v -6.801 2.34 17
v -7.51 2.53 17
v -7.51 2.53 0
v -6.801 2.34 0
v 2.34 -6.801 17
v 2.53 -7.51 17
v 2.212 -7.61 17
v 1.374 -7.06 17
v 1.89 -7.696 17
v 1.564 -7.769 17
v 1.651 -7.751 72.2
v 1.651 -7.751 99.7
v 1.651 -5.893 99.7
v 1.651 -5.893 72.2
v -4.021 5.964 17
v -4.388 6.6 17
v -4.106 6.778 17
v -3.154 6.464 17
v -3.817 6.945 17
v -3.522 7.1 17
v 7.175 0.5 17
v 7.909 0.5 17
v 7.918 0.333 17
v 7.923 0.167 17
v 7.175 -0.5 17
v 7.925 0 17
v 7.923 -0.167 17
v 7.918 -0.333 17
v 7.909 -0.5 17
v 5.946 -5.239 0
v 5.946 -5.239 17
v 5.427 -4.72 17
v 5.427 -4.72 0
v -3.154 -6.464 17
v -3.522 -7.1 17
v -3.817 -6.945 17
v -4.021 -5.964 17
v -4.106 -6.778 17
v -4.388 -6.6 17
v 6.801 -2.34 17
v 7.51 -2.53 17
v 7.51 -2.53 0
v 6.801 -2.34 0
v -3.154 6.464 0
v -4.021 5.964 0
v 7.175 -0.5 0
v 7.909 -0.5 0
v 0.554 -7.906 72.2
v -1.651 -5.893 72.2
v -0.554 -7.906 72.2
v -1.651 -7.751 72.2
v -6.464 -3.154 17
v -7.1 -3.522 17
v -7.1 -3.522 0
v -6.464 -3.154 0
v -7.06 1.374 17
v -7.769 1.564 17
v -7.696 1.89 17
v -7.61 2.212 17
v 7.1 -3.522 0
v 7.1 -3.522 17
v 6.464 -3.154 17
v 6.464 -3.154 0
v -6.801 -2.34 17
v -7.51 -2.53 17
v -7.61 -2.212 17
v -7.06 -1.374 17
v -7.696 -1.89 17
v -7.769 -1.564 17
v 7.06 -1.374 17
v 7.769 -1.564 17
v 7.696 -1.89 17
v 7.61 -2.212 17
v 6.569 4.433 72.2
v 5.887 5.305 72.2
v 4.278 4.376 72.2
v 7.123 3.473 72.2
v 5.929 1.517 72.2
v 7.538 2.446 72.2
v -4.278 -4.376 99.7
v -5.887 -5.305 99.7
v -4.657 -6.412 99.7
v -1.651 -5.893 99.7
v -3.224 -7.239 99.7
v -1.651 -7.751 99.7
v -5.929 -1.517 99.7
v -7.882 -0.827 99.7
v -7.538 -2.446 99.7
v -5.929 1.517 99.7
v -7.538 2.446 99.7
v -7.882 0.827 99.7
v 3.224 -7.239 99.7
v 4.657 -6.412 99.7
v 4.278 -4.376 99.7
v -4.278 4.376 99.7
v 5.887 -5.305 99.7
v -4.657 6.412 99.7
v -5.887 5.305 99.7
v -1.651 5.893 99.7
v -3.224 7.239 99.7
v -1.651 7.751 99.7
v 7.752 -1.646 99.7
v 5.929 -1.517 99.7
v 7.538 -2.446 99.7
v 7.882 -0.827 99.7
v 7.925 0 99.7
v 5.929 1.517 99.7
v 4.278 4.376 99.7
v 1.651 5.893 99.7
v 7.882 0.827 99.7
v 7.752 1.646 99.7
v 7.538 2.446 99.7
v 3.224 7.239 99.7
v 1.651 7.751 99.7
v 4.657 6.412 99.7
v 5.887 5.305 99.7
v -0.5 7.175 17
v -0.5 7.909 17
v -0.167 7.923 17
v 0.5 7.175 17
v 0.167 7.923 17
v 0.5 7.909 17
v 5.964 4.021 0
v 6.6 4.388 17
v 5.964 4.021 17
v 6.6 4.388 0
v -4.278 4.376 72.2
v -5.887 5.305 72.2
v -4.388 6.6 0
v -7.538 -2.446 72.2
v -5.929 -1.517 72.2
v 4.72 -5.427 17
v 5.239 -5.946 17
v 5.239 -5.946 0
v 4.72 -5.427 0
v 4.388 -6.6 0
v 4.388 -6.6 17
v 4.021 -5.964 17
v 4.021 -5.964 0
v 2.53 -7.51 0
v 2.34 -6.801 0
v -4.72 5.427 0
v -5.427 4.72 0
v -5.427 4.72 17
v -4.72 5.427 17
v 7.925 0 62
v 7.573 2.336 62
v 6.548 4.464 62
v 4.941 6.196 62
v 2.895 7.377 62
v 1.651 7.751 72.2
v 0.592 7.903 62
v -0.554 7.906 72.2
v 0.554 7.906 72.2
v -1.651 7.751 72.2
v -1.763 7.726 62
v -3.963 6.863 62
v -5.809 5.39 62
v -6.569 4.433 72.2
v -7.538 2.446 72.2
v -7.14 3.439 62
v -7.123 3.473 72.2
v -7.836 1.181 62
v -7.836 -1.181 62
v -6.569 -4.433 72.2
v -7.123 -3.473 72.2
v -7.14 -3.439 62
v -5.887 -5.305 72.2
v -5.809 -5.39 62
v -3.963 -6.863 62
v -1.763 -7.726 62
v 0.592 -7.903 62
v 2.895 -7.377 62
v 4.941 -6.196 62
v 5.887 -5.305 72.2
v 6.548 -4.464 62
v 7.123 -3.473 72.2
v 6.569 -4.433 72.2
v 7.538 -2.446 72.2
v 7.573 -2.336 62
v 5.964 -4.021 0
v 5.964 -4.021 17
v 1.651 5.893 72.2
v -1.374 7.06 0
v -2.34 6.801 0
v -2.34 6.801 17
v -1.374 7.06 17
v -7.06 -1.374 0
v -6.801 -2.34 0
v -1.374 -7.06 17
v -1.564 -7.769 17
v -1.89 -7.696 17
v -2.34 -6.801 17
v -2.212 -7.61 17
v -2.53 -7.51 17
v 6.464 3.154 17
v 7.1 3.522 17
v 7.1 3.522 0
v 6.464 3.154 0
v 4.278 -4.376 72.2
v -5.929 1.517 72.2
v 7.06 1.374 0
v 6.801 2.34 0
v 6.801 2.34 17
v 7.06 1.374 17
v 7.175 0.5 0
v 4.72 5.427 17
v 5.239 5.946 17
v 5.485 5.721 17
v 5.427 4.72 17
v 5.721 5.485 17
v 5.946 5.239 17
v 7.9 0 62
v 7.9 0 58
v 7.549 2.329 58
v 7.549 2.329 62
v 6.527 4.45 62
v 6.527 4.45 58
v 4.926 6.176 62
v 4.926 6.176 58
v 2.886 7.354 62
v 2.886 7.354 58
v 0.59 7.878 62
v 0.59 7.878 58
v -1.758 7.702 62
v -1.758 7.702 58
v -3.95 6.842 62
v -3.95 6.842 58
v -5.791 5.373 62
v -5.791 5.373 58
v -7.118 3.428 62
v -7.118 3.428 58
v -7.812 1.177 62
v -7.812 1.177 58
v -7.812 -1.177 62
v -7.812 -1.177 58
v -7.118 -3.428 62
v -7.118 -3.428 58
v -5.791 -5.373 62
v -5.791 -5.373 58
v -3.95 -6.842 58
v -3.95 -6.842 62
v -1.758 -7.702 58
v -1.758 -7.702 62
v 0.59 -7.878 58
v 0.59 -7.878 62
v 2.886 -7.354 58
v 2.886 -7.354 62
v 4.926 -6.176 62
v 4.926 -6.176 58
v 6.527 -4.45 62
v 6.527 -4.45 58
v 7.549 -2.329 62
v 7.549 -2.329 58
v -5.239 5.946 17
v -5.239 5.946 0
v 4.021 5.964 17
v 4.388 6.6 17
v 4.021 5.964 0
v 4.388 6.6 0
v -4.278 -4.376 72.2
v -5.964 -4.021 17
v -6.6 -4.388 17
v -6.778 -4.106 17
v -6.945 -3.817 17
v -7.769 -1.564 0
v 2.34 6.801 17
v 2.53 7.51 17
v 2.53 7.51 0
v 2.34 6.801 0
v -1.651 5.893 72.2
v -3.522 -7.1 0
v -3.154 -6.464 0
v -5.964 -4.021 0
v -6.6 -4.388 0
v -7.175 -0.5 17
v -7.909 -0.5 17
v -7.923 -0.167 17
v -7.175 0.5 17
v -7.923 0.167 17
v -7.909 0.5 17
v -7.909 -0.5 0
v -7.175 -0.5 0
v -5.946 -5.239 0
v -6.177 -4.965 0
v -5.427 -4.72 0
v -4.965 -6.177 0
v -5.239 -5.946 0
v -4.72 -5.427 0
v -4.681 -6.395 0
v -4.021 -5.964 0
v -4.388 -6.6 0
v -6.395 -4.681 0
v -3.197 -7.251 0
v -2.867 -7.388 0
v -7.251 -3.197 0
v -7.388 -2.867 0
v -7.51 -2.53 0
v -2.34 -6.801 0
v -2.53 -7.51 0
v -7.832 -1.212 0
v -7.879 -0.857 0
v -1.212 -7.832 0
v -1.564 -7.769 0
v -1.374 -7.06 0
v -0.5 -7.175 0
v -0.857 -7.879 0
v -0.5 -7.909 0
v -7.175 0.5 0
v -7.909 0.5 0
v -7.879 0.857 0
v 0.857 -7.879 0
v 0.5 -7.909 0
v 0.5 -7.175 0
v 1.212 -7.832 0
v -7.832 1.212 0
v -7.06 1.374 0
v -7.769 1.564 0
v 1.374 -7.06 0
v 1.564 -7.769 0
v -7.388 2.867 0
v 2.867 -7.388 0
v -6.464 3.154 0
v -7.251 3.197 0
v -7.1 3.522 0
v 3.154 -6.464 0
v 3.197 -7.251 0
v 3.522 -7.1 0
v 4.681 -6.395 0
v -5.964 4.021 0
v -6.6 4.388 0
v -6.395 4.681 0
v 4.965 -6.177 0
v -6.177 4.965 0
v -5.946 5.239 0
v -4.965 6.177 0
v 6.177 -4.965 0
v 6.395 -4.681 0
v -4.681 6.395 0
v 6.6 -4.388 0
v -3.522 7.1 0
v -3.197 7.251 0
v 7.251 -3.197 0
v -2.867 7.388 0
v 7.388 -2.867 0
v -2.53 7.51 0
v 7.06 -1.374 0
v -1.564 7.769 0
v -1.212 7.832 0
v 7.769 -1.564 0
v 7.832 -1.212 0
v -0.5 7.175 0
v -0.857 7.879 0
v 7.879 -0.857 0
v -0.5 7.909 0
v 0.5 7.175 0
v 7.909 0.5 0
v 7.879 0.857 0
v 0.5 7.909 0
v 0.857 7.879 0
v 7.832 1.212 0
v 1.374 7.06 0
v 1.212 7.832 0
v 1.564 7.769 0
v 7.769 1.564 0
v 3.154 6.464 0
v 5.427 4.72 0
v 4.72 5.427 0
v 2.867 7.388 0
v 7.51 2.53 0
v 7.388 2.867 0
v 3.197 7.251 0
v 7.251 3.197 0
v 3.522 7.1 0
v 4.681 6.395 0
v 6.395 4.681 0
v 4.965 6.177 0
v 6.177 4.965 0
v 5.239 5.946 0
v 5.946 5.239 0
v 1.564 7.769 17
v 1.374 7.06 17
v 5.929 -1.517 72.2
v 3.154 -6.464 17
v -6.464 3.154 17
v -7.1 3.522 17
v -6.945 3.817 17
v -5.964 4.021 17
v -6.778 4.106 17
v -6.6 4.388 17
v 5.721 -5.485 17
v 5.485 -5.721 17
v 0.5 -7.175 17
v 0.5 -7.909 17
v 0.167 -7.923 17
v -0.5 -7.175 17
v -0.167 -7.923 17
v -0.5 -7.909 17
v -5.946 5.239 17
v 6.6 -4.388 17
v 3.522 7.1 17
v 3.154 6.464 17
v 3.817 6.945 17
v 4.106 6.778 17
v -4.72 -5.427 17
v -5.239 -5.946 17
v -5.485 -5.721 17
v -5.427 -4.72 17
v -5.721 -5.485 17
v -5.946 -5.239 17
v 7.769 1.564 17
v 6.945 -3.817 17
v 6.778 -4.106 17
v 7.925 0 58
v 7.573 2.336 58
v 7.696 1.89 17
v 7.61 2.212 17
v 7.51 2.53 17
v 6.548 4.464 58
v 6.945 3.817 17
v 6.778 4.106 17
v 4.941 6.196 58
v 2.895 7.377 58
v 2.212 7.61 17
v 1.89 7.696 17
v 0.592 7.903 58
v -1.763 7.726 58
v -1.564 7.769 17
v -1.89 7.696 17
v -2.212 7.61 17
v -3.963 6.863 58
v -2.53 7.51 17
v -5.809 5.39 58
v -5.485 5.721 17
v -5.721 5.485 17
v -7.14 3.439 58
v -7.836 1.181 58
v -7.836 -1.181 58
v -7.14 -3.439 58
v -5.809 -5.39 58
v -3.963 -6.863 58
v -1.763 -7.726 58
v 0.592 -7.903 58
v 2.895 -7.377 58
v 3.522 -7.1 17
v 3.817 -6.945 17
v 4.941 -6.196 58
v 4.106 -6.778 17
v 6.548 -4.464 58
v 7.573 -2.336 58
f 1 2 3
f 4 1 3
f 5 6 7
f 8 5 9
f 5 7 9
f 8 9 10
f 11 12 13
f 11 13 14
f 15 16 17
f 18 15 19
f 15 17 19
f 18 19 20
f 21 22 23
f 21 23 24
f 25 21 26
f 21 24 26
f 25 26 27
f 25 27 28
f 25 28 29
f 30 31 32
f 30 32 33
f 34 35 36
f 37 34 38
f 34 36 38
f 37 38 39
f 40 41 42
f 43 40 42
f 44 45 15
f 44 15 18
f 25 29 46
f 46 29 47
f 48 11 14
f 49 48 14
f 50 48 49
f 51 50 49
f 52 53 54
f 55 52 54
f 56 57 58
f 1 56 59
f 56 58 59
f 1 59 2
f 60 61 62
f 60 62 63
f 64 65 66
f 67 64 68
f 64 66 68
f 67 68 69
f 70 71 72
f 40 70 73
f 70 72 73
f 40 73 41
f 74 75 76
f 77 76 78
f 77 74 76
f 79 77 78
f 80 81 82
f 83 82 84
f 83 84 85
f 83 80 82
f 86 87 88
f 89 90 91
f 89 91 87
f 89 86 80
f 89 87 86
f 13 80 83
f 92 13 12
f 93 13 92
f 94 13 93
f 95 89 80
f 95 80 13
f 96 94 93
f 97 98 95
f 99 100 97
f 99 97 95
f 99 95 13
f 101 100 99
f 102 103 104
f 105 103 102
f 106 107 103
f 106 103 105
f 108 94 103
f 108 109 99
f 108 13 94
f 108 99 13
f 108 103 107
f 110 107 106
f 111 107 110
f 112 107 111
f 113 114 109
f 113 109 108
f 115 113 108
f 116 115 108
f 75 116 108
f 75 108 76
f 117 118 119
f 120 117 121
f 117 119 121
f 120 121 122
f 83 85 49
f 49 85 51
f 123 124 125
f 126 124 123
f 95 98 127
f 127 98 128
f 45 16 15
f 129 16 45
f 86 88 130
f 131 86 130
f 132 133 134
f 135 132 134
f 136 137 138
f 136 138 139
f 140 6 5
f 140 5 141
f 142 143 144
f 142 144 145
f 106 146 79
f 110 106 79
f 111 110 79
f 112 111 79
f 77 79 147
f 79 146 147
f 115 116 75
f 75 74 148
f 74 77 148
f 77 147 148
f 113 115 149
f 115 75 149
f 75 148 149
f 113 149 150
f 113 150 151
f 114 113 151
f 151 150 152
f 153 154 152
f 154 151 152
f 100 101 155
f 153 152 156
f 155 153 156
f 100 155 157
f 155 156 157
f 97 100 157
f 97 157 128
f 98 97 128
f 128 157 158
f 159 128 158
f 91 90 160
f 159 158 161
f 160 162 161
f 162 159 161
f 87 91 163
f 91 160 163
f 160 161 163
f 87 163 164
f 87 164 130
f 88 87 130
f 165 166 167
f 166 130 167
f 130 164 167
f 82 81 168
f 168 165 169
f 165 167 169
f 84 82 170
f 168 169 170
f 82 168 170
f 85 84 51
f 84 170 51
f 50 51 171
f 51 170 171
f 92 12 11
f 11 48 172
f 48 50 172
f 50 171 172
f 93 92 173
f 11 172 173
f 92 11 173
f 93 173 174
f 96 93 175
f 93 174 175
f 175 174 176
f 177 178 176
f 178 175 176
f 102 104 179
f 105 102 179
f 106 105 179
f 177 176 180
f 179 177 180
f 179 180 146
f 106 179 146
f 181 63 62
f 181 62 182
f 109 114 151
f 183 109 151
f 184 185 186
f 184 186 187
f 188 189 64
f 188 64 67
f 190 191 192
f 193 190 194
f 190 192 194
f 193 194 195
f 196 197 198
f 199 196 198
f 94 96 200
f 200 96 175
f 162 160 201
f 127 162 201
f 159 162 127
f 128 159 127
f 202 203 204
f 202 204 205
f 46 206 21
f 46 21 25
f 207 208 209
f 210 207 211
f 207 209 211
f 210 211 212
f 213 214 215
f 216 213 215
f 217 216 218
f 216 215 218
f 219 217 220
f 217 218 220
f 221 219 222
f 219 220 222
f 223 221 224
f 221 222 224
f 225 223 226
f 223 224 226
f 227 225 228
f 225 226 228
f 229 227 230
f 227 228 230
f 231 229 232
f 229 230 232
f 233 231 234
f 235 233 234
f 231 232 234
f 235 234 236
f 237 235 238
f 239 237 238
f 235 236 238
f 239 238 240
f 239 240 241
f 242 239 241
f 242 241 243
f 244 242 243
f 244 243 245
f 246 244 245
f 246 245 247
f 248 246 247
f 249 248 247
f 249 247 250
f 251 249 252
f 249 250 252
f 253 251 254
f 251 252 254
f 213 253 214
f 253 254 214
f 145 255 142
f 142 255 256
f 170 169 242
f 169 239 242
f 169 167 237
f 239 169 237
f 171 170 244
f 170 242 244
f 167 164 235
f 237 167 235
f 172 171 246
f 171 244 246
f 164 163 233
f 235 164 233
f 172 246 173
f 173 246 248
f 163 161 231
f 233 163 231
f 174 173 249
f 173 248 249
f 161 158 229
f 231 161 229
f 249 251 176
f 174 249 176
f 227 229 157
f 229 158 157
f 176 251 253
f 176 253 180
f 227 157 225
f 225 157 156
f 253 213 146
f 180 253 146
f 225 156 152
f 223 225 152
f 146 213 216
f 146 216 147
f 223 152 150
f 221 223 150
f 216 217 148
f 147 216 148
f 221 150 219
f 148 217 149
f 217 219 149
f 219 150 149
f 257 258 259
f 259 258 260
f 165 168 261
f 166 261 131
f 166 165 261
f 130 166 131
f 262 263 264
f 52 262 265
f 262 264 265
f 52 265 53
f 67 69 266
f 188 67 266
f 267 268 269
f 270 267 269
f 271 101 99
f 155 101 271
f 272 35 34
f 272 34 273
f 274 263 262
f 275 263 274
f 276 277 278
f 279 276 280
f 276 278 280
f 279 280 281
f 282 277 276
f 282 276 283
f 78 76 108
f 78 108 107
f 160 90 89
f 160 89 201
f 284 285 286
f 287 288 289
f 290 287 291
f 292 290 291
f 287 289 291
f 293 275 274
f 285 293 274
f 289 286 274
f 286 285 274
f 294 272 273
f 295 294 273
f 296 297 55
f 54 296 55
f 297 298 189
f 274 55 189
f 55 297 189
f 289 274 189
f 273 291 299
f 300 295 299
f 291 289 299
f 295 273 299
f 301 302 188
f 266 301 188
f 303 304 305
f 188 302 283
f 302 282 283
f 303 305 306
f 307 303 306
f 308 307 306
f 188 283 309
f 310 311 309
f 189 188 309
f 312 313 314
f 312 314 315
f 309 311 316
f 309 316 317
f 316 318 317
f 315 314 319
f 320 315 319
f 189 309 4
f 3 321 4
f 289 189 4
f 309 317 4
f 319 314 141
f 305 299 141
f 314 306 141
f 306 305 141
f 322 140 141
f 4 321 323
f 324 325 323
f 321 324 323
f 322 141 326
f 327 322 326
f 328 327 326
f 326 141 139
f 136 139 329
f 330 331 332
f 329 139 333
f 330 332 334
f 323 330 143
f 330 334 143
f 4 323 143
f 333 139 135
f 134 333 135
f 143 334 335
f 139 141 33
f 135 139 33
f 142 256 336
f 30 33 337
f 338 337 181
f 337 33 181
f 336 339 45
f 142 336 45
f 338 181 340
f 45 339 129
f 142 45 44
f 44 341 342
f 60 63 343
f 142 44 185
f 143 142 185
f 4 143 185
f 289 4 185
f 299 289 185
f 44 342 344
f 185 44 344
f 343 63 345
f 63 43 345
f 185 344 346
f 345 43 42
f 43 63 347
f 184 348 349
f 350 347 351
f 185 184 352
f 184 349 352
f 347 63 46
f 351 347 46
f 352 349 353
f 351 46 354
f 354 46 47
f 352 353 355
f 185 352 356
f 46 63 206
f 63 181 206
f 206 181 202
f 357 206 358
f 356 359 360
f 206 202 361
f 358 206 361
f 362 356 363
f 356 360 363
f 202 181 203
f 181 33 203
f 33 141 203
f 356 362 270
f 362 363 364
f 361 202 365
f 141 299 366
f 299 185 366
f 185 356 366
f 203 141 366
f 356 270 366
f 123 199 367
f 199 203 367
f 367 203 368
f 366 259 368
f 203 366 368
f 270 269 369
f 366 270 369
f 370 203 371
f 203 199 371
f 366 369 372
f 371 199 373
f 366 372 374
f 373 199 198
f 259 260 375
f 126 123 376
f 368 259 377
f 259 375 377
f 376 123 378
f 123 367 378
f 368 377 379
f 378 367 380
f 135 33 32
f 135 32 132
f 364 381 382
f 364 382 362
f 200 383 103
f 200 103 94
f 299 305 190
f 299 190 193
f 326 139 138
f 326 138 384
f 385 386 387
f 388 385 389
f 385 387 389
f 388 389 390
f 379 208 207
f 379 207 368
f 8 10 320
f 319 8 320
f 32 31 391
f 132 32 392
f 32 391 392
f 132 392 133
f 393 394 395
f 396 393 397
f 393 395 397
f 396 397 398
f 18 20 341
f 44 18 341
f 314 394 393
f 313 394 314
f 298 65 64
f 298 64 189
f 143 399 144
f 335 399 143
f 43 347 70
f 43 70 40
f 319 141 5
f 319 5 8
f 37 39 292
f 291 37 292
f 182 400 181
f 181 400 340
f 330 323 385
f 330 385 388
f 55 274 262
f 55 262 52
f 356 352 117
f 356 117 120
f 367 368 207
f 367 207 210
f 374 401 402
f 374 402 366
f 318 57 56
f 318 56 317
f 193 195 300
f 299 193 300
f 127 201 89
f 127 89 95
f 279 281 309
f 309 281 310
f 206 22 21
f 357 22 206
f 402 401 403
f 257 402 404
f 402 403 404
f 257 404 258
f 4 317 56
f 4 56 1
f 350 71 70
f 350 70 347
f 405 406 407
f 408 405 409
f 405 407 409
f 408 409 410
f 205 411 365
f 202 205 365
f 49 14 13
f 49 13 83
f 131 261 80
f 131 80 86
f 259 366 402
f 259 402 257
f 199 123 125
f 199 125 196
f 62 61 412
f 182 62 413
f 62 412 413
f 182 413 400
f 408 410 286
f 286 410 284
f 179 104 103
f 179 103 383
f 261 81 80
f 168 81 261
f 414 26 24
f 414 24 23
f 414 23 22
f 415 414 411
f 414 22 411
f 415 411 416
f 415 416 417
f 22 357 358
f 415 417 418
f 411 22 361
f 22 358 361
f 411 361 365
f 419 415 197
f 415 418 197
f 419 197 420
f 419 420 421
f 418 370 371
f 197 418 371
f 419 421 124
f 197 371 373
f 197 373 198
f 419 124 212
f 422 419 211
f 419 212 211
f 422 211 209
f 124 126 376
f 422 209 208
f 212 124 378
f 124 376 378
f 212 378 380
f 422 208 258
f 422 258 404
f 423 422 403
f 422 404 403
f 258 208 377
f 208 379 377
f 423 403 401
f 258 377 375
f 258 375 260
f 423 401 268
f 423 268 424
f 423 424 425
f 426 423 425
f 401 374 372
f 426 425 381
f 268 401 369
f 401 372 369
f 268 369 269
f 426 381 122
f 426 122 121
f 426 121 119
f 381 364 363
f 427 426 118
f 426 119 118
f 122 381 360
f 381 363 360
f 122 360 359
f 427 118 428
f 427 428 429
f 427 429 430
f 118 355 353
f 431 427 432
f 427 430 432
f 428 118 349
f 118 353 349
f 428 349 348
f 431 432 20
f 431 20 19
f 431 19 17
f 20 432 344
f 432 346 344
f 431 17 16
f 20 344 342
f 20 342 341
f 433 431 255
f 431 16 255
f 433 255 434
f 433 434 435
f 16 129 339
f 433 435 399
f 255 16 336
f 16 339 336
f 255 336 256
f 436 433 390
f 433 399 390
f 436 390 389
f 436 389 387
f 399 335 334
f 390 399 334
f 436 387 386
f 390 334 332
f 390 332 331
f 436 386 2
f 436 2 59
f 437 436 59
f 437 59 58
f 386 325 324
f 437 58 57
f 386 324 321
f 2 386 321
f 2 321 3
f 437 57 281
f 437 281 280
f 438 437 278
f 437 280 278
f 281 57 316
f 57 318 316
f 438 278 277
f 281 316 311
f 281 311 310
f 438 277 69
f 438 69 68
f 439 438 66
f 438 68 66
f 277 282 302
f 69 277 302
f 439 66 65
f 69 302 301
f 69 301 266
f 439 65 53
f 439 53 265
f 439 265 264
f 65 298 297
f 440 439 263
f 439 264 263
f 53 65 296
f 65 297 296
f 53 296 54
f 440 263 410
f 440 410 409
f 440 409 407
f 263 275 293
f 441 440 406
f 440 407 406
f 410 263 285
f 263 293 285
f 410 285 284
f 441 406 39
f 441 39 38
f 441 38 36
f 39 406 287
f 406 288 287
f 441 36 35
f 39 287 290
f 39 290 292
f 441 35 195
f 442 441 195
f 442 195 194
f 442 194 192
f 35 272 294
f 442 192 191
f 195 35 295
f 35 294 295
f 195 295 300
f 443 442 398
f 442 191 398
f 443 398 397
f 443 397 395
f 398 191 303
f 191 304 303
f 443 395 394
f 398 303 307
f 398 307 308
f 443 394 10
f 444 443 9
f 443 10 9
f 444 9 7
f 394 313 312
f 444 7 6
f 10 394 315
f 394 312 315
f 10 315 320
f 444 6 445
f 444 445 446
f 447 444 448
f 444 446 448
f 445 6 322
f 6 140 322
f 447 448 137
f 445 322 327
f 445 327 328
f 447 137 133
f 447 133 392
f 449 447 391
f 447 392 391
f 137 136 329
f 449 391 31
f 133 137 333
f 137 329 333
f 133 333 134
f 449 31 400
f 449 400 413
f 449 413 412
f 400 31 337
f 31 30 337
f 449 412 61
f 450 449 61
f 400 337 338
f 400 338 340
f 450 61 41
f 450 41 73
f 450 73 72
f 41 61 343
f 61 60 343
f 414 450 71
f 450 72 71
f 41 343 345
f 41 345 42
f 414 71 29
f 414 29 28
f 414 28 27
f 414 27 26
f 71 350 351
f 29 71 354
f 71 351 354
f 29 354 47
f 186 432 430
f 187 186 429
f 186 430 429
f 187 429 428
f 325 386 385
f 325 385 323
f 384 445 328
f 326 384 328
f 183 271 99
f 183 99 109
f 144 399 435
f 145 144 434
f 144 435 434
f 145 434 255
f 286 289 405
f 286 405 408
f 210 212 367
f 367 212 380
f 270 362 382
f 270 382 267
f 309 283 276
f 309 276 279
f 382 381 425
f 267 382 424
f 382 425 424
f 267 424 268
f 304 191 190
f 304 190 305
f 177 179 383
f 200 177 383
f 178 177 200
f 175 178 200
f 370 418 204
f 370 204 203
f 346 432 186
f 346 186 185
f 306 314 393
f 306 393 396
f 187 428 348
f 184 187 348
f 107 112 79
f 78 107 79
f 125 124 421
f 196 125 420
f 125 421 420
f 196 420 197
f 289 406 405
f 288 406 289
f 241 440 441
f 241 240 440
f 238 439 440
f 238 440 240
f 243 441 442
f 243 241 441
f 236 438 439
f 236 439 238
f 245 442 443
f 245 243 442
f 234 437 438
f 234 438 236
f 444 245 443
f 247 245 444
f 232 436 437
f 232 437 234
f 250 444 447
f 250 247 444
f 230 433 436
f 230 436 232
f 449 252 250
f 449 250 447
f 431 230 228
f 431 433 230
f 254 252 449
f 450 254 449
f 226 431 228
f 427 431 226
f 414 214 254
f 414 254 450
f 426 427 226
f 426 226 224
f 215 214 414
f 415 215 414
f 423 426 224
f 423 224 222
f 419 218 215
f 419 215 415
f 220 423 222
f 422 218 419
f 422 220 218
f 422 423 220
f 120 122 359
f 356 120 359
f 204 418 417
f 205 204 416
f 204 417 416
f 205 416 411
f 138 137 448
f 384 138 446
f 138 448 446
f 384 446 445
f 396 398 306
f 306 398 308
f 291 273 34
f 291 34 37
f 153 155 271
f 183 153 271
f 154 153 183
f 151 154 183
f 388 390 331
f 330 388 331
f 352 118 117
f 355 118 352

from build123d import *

# Parameters (mm, degrees)
SKETCH1_R           = 7.925000025
BOSS_EXTRUDE1_DEPTH = 58.000000078
SKETCH2_R           = 7.899999948
BOSS_EXTRUDE2_DEPTH = 4
SKETCH3_R           = 7.925000025
BOSS_EXTRUDE3_DEPTH = 37.7
SKETCH4_W           = 3.302
SKETCH4_H           = 27.5
CUT_EXTRUDE1_DEPTH  = 2.032
CIRPATTERN1_COUNT   = 6
SKETCH10_W          = 1
SKETCH10_H          = 17
CUT_EXTRUDE2_DEPTH  = 0.75
CIRPATTERN2_COUNT   = 24


with BuildPart() as part:
    # Sketch1 → Boss-Extrude1 (new body)
    with BuildSketch(Plane.XY):
        Circle(SKETCH1_R)
    extrude(amount=BOSS_EXTRUDE1_DEPTH)

    # Sketch2 → Boss-Extrude2 (add)
    with BuildSketch(Plane.XY.offset(58.000000078)):
        Circle(SKETCH2_R)
    extrude(amount=BOSS_EXTRUDE2_DEPTH)

    # Sketch3 → Boss-Extrude3 (add)
    with BuildSketch(Plane.XY.offset(62.000000078)):
        Circle(SKETCH3_R)
    extrude(amount=BOSS_EXTRUDE3_DEPTH)

    # Sketch4 → Cut-Extrude1 (cut)
    with BuildSketch(Plane(origin=(0, 7.925000025, 0), x_dir=(1, 0, 0), z_dir=(0, 1, 0))):
        with Locations((0, -85.950000078)):
            Rectangle(SKETCH4_W, SKETCH4_H)
    cut_extrude1 = extrude(amount=-CUT_EXTRUDE1_DEPTH, mode=Mode.SUBTRACT)

    # CirPattern1: Cut-Extrude1 ×6 about axis
    cirpattern1_axis = Axis((0, 0, 0), (0, 0, 1))
    for i in range(1, CIRPATTERN1_COUNT):
        add(cut_extrude1.rotate(cirpattern1_axis, i * 360 / CIRPATTERN1_COUNT), mode=Mode.SUBTRACT)

    # Sketch10 → Cut-Extrude2 (cut)
    with BuildSketch(Plane(origin=(0, 7.925000025, 0), x_dir=(1, 0, 0), z_dir=(0, 1, 0))):
        with Locations((0, -8.5)):
            Rectangle(SKETCH10_W, SKETCH10_H)
    cut_extrude2 = extrude(amount=-CUT_EXTRUDE2_DEPTH, mode=Mode.SUBTRACT)

    # CirPattern2: Cut-Extrude2 ×24 about axis
    cirpattern2_axis = Axis((0, 0, 0), (0, 0, 1))
    for i in range(1, CIRPATTERN2_COUNT):
        add(cut_extrude2.rotate(cirpattern2_axis, i * 360 / CIRPATTERN2_COUNT), mode=Mode.SUBTRACT)


solid = part.part
